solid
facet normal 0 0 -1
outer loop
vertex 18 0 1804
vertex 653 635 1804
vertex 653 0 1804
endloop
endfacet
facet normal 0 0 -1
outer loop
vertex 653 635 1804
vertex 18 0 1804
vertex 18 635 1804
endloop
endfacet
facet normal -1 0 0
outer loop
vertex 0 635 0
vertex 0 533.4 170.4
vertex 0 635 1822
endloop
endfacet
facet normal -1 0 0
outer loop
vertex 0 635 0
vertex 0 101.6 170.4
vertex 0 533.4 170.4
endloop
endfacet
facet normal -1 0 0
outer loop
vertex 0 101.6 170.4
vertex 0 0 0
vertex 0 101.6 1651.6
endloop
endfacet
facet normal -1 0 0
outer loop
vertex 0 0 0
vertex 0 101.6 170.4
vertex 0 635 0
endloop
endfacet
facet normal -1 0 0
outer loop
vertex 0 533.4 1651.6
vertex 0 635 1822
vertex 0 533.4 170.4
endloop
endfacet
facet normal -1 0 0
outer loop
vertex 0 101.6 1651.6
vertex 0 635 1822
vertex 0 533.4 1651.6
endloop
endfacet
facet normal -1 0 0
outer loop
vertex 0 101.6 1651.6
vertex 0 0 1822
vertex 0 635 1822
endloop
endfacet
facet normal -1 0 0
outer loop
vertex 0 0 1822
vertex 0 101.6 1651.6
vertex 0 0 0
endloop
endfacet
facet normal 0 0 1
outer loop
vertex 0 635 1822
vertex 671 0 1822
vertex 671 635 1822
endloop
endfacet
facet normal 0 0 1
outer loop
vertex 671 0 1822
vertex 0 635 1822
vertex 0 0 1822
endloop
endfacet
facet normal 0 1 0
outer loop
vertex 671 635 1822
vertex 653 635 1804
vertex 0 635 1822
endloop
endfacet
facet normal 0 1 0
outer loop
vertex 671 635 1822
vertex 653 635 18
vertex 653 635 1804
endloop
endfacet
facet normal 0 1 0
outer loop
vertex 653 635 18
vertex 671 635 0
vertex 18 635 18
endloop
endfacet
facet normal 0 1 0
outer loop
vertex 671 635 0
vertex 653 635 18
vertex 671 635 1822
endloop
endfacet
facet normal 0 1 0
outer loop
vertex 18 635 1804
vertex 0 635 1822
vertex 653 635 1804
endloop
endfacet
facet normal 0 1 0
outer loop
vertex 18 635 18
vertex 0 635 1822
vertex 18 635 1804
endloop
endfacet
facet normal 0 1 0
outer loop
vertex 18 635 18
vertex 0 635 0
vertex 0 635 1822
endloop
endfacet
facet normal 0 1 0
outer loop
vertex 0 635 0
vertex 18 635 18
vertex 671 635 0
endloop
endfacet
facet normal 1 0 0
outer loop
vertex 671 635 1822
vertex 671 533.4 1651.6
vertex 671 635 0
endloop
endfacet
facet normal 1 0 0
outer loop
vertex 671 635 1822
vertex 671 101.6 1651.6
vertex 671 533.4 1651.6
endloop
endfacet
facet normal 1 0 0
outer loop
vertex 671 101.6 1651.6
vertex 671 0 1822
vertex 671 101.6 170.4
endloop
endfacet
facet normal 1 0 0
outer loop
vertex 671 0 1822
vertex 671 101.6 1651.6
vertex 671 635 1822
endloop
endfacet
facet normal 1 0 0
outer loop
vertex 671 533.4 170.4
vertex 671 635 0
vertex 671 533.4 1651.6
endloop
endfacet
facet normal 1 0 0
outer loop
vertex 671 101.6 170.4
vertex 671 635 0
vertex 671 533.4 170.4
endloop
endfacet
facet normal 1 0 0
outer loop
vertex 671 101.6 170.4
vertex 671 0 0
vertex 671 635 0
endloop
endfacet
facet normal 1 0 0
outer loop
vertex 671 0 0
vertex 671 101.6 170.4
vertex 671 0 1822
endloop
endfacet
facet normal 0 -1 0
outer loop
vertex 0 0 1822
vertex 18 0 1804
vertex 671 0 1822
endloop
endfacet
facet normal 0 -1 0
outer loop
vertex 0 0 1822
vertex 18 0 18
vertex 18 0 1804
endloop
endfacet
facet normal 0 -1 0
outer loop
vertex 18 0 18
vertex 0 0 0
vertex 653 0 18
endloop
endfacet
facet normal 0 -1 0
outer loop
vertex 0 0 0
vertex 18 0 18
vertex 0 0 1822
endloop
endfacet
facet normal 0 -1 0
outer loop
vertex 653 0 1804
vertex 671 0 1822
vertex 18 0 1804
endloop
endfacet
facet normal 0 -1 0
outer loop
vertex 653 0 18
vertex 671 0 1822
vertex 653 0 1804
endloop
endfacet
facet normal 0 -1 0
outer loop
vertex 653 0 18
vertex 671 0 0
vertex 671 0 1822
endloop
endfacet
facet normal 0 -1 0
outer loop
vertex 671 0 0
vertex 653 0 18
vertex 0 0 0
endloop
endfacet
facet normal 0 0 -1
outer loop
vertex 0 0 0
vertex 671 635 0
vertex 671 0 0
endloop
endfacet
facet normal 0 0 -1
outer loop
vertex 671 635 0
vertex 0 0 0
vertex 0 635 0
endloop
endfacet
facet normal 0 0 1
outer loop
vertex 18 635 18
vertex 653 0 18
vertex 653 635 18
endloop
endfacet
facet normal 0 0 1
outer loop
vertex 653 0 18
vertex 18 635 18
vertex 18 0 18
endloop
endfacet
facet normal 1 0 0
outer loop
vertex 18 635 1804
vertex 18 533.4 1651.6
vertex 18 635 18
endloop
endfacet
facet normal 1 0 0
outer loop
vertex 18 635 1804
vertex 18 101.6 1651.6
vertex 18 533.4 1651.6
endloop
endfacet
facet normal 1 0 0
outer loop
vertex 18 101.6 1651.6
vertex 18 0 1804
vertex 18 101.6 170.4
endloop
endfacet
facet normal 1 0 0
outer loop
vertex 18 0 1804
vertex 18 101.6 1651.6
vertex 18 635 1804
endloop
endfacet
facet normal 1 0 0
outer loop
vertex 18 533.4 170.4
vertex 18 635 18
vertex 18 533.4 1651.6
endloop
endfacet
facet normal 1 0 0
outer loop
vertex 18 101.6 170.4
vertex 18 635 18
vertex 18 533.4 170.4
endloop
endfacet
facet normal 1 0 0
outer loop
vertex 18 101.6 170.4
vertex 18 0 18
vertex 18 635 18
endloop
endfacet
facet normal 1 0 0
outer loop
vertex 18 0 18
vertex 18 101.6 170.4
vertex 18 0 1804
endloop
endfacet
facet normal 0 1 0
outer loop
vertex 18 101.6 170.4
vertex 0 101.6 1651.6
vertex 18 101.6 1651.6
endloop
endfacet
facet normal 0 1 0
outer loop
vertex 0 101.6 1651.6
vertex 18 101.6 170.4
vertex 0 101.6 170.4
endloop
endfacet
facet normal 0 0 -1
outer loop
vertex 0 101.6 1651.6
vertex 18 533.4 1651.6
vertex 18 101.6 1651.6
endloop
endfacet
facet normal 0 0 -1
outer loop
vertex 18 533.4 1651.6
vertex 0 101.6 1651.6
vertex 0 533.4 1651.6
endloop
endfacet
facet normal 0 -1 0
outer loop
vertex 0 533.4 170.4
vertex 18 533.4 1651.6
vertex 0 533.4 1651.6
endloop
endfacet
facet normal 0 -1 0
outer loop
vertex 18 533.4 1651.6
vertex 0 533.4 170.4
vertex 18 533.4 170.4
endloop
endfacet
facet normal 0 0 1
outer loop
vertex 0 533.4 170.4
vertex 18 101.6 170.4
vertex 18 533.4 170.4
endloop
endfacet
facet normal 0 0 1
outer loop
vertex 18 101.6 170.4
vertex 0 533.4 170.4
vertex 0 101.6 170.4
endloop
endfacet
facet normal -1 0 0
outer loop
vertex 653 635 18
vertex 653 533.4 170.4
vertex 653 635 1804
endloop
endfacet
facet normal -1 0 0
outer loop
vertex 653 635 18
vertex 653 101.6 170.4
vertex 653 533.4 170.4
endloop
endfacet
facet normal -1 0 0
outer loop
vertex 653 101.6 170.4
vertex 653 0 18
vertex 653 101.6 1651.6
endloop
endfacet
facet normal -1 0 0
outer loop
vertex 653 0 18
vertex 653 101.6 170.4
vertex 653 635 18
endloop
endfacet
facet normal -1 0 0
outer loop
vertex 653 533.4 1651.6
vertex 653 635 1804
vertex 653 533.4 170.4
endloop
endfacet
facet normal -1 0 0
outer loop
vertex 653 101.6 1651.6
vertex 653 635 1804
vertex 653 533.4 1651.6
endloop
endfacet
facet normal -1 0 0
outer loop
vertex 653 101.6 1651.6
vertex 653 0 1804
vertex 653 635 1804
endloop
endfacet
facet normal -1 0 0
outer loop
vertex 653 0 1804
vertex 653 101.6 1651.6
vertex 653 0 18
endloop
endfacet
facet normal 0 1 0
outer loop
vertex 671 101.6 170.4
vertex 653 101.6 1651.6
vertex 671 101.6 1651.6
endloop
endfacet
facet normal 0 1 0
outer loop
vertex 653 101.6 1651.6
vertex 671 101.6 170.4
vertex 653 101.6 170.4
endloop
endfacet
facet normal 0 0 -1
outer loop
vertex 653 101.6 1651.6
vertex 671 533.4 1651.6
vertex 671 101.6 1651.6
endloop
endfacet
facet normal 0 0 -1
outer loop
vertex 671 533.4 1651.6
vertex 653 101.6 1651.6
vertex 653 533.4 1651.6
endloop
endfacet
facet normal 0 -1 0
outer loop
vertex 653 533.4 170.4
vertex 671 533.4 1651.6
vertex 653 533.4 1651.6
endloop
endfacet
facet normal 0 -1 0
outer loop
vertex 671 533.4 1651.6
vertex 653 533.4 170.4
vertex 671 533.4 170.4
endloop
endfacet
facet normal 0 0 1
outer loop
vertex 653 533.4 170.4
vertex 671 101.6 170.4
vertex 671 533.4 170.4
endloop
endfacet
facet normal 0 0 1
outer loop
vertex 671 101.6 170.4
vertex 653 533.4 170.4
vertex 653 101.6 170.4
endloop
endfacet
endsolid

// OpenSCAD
in=25.4;
height=1786;
depth=25*in;
width=25*in;

rack_thickness=2*in;

door_gap=in/2;
door_y=depth-rack_thickness*2-4*in;
door_z=height-6*in*2;

wood=18;

door_corner=4*in;

module wood() {
	linear_extrude(height=wood)
	children();
}

module top() {
	square([width+wood*2,depth]);
}

module base() {
	square([width+wood*2,depth]);
}

module right() {
	side();
}

module left() {
	side();
}

module side() {
	difference() {
		square([depth,height+wood*2]);
		translate([depth/2-door_y/2,height/2+wood-door_z/2])
		square([door_y,door_z]);
	}
}

translate([0,0,height+wood])
wood()
top();

wood()
base();

rotate([90,0,90])
wood()
left();

translate([width+wood,0])
rotate([90,0,90])
wood()
right();

cable_tray_x=2*in;
cable_tray_y=2*in;
cable_tray_z=39*in;

cable_gap=in;

*color("blue")
translate([wood,depth-rack_thickness-cable_gap-cable_tray_y,height-cable_tray_z])
cube([cable_tray_x,cable_tray_y,cable_tray_z]);
